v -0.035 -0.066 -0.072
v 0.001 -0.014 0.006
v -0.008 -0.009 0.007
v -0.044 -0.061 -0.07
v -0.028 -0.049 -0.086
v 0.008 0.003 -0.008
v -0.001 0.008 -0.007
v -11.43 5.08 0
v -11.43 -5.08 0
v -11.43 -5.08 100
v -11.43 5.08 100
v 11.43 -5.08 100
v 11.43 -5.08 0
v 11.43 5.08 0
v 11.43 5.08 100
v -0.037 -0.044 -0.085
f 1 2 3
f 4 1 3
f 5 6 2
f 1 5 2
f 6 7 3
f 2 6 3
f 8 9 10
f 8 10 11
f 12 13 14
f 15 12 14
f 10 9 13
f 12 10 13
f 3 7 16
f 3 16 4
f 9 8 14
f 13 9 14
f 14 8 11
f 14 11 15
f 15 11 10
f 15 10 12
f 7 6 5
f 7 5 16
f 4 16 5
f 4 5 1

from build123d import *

# Parameters (mm, degrees)
RECTANGLE_W           = 22.86
RECTANGLE_H           = 10.16
EXTRUDE_DEPTH         = 100
CLONE_SCALE_SCALE     = 0.001
CLONE_ROLL_ANGLE      = 171.394155
CLONE_PITCH_ANGLE     = -38.256467
CLONE_PLACEMENT_ANGLE = -110.851349


with BuildPart() as extrude_body:
    # Rectangle → Extrude (new body)
    with BuildSketch(Plane(origin=(-11.43, -5.08, 0), x_dir=(1, 0, 0), z_dir=(0, 0, 1))):
        with Locations((11.43, 5.08)):
            Rectangle(RECTANGLE_W, RECTANGLE_H)
    extrude(amount=EXTRUDE_DEPTH)


with BuildPart() as extrude001:
    # Clone base: copy of Extrude body
    add(extrude_body.part)


with BuildPart() as extrude001_1:
    # Clone scale: moved
    add(extrude001.part.scale(CLONE_SCALE_SCALE))


with BuildPart() as extrude001_2:
    # Clone roll: moved
    add(extrude001_1.part.rotate(Axis((0, 0, 0), (1, 0, 0)), CLONE_ROLL_ANGLE))


with BuildPart() as extrude001_3:
    # Clone pitch: moved
    add(extrude001_2.part.rotate(Axis((0, 0, 0), (0, 1, 0)), CLONE_PITCH_ANGLE))


with BuildPart() as extrude001_4:
    # Clone placement: moved
    add(extrude001_3.part.moved(Location((-8.3e-05, -0.003101, -0.00049))).rotate(Axis((-8.3e-05, -0.003101, -0.00049), (0, 0, 1)), CLONE_PLACEMENT_ANGLE))


solid = Compound([extrude_body.part, extrude001_4.part])
